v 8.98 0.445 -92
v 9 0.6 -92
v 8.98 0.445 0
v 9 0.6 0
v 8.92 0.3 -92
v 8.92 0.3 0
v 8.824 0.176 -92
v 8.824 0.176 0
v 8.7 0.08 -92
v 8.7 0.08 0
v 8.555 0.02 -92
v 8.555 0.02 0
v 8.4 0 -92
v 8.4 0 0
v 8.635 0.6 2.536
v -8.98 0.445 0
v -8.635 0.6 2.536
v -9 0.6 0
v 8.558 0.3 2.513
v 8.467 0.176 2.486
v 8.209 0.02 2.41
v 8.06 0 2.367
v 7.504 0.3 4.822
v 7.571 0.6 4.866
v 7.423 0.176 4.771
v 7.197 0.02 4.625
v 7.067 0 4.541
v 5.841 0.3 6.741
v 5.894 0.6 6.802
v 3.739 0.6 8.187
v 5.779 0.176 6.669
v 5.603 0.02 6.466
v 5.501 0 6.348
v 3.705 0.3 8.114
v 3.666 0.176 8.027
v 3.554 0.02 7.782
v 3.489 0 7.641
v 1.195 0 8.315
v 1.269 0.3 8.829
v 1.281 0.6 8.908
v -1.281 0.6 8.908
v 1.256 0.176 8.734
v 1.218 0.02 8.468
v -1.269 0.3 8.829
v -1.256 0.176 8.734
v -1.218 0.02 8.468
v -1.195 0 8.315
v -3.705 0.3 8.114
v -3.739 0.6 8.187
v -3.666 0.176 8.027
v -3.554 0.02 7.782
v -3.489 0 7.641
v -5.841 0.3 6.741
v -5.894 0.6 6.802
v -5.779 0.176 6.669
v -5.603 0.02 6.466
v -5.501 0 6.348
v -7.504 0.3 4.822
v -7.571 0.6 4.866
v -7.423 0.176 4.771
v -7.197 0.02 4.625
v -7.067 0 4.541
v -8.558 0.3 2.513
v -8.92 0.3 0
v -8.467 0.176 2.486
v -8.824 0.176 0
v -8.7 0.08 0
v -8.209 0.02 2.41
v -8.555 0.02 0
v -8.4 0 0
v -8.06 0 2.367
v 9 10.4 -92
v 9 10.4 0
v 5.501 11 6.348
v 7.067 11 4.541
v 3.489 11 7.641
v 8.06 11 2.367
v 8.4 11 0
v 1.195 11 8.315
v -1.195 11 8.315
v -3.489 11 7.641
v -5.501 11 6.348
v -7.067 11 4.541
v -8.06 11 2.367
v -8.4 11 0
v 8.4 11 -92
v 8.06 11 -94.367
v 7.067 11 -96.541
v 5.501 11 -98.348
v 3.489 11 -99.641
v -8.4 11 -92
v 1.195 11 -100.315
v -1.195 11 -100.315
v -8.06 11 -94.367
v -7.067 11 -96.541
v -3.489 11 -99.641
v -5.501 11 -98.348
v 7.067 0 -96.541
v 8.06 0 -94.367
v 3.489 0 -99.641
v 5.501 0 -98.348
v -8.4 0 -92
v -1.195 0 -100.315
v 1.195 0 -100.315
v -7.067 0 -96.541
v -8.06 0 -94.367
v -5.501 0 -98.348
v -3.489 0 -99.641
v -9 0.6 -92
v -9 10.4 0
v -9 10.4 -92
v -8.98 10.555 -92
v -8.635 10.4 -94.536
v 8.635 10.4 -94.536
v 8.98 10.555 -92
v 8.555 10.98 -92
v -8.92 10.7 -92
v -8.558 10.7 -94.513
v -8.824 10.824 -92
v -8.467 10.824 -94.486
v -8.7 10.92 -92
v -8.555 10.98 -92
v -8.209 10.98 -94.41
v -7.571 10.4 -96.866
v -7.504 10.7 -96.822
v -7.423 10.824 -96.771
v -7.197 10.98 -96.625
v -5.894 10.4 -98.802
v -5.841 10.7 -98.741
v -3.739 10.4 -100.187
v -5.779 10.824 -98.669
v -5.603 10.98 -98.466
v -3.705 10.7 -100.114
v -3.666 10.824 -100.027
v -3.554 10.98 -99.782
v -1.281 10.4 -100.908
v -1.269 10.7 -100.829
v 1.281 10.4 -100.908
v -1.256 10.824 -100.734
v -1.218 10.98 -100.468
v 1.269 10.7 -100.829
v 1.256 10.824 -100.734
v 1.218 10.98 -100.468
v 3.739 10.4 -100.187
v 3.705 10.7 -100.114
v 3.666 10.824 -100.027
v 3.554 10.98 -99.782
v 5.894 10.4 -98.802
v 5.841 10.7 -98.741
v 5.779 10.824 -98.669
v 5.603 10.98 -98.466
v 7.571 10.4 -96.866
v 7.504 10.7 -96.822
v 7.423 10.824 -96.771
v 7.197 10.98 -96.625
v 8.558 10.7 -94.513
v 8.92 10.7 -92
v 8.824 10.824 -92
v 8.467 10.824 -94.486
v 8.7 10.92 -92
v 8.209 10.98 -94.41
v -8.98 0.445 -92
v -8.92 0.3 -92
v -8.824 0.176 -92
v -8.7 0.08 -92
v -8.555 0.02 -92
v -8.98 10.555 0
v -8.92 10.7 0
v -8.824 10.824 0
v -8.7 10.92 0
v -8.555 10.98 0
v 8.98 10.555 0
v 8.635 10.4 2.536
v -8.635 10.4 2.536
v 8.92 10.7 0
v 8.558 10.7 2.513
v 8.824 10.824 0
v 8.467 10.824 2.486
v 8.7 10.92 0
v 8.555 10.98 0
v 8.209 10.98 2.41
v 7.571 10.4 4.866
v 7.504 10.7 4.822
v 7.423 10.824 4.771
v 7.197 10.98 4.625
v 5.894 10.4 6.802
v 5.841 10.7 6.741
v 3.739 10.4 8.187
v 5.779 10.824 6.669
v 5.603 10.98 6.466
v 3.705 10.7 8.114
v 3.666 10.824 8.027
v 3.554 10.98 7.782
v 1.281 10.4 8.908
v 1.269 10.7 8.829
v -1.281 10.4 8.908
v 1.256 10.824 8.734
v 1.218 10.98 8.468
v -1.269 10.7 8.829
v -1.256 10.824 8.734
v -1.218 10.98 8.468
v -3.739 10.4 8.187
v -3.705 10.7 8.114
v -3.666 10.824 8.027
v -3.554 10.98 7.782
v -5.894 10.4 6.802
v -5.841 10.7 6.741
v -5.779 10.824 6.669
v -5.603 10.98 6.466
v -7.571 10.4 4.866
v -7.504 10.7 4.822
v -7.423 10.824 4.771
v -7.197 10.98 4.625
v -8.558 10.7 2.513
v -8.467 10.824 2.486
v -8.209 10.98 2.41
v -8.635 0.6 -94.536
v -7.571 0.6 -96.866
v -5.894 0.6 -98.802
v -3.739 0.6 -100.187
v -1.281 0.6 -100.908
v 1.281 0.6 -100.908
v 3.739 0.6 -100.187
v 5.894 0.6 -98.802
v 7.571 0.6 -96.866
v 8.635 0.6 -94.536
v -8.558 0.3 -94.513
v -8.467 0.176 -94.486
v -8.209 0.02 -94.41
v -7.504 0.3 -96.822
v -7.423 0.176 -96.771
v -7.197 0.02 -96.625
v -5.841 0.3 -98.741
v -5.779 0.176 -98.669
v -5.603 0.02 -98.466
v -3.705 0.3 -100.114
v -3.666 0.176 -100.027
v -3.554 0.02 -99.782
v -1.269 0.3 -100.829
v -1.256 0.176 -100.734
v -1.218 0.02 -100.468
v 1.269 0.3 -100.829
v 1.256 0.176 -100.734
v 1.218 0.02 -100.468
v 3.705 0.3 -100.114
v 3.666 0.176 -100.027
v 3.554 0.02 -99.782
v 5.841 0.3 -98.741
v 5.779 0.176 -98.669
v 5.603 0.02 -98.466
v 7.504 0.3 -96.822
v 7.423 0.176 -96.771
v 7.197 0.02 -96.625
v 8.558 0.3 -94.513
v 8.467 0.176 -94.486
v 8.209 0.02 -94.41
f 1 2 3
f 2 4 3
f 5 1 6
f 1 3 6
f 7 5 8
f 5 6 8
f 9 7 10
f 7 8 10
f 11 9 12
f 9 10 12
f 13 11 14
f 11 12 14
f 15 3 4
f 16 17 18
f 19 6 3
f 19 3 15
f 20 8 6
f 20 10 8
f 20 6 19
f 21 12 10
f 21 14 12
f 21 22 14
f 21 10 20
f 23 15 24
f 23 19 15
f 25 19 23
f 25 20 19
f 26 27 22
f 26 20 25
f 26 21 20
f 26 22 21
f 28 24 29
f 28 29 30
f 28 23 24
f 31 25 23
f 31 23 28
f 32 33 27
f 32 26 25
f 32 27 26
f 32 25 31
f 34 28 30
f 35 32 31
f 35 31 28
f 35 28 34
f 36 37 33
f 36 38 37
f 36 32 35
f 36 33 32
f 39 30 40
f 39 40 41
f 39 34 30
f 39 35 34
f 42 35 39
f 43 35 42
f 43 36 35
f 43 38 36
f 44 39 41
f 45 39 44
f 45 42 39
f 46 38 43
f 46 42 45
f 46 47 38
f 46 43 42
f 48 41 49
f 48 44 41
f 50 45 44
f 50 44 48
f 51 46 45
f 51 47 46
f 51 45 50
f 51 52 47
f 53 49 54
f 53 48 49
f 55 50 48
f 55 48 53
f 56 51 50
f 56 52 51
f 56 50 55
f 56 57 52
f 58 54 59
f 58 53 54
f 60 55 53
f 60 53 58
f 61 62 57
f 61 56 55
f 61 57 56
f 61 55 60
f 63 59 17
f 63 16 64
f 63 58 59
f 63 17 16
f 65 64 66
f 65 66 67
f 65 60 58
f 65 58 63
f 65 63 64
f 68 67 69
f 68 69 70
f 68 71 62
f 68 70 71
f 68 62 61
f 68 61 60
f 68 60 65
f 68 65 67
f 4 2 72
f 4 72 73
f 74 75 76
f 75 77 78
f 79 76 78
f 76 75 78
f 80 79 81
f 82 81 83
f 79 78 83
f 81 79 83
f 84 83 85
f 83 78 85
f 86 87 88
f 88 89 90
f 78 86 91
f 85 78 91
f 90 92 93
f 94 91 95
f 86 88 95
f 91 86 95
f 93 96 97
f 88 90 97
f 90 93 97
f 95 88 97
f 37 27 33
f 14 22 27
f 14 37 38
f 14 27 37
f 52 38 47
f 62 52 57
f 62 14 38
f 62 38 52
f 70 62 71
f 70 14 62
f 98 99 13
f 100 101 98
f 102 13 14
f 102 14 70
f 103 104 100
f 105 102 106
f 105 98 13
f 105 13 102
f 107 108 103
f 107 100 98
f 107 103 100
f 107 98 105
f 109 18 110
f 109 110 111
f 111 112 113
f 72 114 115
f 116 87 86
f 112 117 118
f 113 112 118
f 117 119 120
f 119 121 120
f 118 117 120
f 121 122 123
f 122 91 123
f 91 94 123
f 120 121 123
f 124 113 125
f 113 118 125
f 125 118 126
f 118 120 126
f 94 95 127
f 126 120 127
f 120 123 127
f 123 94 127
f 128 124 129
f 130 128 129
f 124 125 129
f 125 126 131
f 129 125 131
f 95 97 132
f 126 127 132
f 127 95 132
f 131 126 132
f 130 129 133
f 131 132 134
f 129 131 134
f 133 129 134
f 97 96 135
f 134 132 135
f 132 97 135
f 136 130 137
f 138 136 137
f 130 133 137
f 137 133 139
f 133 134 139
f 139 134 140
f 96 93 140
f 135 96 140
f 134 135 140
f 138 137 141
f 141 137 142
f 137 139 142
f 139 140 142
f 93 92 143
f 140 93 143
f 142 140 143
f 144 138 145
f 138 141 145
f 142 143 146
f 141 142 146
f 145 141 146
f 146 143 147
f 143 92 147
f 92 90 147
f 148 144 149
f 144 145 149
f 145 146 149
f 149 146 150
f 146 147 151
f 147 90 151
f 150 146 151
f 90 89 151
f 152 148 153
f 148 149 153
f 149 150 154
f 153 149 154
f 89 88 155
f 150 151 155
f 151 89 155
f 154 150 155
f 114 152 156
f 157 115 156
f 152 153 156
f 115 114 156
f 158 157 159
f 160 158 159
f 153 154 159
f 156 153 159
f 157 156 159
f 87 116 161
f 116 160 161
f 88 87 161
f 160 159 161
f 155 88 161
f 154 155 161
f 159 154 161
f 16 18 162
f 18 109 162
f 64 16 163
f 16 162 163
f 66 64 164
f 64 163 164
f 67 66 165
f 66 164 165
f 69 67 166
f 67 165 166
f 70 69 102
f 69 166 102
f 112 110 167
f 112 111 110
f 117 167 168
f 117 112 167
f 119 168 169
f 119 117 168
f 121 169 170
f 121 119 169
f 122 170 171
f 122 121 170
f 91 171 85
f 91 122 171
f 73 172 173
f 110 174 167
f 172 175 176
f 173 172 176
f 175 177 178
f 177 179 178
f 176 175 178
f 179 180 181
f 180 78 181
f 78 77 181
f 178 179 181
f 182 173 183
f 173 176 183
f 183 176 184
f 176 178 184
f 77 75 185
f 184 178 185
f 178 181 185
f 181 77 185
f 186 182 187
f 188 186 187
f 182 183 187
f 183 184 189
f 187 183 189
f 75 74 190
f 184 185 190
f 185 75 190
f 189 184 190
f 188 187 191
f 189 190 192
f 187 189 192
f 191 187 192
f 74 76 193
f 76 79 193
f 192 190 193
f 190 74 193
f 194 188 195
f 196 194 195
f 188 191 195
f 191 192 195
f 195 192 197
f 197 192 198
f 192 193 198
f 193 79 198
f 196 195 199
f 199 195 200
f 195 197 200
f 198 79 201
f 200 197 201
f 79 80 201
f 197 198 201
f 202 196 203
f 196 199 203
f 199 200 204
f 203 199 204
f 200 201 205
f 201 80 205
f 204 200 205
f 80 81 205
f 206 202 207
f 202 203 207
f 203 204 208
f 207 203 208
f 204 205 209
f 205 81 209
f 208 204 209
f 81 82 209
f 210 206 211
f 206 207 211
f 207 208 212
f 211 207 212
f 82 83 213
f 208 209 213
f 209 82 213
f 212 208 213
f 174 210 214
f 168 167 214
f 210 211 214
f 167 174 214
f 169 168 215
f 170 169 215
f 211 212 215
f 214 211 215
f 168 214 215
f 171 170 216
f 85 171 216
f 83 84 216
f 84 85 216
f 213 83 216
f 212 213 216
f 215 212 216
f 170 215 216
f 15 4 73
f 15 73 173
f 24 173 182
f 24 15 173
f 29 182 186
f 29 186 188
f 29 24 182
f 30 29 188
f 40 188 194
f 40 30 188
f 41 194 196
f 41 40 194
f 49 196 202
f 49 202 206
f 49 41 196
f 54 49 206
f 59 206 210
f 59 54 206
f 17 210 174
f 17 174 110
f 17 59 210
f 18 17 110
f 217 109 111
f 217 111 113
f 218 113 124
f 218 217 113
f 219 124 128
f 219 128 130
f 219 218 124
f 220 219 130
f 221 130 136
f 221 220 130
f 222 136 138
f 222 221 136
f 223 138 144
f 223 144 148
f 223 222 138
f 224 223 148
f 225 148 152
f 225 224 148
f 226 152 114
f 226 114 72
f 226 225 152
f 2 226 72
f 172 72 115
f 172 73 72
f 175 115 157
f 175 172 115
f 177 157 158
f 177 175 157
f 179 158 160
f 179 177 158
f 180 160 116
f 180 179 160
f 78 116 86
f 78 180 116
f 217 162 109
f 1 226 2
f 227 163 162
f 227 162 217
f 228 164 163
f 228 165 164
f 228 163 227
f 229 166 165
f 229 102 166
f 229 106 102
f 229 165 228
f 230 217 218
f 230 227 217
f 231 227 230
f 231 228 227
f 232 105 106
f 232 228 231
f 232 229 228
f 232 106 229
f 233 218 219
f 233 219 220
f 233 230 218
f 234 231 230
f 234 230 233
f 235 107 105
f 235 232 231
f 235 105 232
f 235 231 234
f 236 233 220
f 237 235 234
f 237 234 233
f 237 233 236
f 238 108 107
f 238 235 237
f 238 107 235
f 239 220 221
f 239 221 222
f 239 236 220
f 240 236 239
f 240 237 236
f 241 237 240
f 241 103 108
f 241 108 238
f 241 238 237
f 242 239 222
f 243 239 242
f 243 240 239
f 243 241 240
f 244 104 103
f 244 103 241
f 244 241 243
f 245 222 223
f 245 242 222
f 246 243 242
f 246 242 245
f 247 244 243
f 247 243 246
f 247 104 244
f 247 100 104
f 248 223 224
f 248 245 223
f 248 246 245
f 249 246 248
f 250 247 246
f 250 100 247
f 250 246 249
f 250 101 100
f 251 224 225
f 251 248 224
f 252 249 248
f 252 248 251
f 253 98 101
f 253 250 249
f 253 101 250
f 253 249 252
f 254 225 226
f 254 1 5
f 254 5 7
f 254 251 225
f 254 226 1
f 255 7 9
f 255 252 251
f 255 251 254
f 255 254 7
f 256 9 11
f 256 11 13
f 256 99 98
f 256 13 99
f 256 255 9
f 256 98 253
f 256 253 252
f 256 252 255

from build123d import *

# Parameters (mm, degrees)
EXTRUDE_1_DEPTH = 11
FILLET_1_R      = 0.6


with BuildPart() as part:
    # Эскиз1 → Бобышка-Вытянуть1 (new body)
    with BuildSketch(Plane(origin=(0, 0, 0), x_dir=(1, 0, 0), z_dir=(0, 1, 0))):
        with BuildLine():
            Line((-9, 0), (-9, 92))
            ThreePointArc((-9, 92), (0, 101), (9, 92))
            Line((9, 92), (9, 0))
            ThreePointArc((9, 0), (0, -9), (-9, 0))
        make_face()
    extrude(amount=EXTRUDE_1_DEPTH)

    # Скругление1
    fillet_1_edges = [part.edges().sort_by_distance(p)[0] for p in [
        (0, 11, -101),
        (-9, 11, -46),
        (0, 11, 9),
        (-9, 0, -46),
        (0, 0, -101),
        (9, 0, -46),
        (0, 0, 9),
        (9, 11, -46),
    ]]
    fillet(fillet_1_edges, radius=FILLET_1_R)


solid = part.part
